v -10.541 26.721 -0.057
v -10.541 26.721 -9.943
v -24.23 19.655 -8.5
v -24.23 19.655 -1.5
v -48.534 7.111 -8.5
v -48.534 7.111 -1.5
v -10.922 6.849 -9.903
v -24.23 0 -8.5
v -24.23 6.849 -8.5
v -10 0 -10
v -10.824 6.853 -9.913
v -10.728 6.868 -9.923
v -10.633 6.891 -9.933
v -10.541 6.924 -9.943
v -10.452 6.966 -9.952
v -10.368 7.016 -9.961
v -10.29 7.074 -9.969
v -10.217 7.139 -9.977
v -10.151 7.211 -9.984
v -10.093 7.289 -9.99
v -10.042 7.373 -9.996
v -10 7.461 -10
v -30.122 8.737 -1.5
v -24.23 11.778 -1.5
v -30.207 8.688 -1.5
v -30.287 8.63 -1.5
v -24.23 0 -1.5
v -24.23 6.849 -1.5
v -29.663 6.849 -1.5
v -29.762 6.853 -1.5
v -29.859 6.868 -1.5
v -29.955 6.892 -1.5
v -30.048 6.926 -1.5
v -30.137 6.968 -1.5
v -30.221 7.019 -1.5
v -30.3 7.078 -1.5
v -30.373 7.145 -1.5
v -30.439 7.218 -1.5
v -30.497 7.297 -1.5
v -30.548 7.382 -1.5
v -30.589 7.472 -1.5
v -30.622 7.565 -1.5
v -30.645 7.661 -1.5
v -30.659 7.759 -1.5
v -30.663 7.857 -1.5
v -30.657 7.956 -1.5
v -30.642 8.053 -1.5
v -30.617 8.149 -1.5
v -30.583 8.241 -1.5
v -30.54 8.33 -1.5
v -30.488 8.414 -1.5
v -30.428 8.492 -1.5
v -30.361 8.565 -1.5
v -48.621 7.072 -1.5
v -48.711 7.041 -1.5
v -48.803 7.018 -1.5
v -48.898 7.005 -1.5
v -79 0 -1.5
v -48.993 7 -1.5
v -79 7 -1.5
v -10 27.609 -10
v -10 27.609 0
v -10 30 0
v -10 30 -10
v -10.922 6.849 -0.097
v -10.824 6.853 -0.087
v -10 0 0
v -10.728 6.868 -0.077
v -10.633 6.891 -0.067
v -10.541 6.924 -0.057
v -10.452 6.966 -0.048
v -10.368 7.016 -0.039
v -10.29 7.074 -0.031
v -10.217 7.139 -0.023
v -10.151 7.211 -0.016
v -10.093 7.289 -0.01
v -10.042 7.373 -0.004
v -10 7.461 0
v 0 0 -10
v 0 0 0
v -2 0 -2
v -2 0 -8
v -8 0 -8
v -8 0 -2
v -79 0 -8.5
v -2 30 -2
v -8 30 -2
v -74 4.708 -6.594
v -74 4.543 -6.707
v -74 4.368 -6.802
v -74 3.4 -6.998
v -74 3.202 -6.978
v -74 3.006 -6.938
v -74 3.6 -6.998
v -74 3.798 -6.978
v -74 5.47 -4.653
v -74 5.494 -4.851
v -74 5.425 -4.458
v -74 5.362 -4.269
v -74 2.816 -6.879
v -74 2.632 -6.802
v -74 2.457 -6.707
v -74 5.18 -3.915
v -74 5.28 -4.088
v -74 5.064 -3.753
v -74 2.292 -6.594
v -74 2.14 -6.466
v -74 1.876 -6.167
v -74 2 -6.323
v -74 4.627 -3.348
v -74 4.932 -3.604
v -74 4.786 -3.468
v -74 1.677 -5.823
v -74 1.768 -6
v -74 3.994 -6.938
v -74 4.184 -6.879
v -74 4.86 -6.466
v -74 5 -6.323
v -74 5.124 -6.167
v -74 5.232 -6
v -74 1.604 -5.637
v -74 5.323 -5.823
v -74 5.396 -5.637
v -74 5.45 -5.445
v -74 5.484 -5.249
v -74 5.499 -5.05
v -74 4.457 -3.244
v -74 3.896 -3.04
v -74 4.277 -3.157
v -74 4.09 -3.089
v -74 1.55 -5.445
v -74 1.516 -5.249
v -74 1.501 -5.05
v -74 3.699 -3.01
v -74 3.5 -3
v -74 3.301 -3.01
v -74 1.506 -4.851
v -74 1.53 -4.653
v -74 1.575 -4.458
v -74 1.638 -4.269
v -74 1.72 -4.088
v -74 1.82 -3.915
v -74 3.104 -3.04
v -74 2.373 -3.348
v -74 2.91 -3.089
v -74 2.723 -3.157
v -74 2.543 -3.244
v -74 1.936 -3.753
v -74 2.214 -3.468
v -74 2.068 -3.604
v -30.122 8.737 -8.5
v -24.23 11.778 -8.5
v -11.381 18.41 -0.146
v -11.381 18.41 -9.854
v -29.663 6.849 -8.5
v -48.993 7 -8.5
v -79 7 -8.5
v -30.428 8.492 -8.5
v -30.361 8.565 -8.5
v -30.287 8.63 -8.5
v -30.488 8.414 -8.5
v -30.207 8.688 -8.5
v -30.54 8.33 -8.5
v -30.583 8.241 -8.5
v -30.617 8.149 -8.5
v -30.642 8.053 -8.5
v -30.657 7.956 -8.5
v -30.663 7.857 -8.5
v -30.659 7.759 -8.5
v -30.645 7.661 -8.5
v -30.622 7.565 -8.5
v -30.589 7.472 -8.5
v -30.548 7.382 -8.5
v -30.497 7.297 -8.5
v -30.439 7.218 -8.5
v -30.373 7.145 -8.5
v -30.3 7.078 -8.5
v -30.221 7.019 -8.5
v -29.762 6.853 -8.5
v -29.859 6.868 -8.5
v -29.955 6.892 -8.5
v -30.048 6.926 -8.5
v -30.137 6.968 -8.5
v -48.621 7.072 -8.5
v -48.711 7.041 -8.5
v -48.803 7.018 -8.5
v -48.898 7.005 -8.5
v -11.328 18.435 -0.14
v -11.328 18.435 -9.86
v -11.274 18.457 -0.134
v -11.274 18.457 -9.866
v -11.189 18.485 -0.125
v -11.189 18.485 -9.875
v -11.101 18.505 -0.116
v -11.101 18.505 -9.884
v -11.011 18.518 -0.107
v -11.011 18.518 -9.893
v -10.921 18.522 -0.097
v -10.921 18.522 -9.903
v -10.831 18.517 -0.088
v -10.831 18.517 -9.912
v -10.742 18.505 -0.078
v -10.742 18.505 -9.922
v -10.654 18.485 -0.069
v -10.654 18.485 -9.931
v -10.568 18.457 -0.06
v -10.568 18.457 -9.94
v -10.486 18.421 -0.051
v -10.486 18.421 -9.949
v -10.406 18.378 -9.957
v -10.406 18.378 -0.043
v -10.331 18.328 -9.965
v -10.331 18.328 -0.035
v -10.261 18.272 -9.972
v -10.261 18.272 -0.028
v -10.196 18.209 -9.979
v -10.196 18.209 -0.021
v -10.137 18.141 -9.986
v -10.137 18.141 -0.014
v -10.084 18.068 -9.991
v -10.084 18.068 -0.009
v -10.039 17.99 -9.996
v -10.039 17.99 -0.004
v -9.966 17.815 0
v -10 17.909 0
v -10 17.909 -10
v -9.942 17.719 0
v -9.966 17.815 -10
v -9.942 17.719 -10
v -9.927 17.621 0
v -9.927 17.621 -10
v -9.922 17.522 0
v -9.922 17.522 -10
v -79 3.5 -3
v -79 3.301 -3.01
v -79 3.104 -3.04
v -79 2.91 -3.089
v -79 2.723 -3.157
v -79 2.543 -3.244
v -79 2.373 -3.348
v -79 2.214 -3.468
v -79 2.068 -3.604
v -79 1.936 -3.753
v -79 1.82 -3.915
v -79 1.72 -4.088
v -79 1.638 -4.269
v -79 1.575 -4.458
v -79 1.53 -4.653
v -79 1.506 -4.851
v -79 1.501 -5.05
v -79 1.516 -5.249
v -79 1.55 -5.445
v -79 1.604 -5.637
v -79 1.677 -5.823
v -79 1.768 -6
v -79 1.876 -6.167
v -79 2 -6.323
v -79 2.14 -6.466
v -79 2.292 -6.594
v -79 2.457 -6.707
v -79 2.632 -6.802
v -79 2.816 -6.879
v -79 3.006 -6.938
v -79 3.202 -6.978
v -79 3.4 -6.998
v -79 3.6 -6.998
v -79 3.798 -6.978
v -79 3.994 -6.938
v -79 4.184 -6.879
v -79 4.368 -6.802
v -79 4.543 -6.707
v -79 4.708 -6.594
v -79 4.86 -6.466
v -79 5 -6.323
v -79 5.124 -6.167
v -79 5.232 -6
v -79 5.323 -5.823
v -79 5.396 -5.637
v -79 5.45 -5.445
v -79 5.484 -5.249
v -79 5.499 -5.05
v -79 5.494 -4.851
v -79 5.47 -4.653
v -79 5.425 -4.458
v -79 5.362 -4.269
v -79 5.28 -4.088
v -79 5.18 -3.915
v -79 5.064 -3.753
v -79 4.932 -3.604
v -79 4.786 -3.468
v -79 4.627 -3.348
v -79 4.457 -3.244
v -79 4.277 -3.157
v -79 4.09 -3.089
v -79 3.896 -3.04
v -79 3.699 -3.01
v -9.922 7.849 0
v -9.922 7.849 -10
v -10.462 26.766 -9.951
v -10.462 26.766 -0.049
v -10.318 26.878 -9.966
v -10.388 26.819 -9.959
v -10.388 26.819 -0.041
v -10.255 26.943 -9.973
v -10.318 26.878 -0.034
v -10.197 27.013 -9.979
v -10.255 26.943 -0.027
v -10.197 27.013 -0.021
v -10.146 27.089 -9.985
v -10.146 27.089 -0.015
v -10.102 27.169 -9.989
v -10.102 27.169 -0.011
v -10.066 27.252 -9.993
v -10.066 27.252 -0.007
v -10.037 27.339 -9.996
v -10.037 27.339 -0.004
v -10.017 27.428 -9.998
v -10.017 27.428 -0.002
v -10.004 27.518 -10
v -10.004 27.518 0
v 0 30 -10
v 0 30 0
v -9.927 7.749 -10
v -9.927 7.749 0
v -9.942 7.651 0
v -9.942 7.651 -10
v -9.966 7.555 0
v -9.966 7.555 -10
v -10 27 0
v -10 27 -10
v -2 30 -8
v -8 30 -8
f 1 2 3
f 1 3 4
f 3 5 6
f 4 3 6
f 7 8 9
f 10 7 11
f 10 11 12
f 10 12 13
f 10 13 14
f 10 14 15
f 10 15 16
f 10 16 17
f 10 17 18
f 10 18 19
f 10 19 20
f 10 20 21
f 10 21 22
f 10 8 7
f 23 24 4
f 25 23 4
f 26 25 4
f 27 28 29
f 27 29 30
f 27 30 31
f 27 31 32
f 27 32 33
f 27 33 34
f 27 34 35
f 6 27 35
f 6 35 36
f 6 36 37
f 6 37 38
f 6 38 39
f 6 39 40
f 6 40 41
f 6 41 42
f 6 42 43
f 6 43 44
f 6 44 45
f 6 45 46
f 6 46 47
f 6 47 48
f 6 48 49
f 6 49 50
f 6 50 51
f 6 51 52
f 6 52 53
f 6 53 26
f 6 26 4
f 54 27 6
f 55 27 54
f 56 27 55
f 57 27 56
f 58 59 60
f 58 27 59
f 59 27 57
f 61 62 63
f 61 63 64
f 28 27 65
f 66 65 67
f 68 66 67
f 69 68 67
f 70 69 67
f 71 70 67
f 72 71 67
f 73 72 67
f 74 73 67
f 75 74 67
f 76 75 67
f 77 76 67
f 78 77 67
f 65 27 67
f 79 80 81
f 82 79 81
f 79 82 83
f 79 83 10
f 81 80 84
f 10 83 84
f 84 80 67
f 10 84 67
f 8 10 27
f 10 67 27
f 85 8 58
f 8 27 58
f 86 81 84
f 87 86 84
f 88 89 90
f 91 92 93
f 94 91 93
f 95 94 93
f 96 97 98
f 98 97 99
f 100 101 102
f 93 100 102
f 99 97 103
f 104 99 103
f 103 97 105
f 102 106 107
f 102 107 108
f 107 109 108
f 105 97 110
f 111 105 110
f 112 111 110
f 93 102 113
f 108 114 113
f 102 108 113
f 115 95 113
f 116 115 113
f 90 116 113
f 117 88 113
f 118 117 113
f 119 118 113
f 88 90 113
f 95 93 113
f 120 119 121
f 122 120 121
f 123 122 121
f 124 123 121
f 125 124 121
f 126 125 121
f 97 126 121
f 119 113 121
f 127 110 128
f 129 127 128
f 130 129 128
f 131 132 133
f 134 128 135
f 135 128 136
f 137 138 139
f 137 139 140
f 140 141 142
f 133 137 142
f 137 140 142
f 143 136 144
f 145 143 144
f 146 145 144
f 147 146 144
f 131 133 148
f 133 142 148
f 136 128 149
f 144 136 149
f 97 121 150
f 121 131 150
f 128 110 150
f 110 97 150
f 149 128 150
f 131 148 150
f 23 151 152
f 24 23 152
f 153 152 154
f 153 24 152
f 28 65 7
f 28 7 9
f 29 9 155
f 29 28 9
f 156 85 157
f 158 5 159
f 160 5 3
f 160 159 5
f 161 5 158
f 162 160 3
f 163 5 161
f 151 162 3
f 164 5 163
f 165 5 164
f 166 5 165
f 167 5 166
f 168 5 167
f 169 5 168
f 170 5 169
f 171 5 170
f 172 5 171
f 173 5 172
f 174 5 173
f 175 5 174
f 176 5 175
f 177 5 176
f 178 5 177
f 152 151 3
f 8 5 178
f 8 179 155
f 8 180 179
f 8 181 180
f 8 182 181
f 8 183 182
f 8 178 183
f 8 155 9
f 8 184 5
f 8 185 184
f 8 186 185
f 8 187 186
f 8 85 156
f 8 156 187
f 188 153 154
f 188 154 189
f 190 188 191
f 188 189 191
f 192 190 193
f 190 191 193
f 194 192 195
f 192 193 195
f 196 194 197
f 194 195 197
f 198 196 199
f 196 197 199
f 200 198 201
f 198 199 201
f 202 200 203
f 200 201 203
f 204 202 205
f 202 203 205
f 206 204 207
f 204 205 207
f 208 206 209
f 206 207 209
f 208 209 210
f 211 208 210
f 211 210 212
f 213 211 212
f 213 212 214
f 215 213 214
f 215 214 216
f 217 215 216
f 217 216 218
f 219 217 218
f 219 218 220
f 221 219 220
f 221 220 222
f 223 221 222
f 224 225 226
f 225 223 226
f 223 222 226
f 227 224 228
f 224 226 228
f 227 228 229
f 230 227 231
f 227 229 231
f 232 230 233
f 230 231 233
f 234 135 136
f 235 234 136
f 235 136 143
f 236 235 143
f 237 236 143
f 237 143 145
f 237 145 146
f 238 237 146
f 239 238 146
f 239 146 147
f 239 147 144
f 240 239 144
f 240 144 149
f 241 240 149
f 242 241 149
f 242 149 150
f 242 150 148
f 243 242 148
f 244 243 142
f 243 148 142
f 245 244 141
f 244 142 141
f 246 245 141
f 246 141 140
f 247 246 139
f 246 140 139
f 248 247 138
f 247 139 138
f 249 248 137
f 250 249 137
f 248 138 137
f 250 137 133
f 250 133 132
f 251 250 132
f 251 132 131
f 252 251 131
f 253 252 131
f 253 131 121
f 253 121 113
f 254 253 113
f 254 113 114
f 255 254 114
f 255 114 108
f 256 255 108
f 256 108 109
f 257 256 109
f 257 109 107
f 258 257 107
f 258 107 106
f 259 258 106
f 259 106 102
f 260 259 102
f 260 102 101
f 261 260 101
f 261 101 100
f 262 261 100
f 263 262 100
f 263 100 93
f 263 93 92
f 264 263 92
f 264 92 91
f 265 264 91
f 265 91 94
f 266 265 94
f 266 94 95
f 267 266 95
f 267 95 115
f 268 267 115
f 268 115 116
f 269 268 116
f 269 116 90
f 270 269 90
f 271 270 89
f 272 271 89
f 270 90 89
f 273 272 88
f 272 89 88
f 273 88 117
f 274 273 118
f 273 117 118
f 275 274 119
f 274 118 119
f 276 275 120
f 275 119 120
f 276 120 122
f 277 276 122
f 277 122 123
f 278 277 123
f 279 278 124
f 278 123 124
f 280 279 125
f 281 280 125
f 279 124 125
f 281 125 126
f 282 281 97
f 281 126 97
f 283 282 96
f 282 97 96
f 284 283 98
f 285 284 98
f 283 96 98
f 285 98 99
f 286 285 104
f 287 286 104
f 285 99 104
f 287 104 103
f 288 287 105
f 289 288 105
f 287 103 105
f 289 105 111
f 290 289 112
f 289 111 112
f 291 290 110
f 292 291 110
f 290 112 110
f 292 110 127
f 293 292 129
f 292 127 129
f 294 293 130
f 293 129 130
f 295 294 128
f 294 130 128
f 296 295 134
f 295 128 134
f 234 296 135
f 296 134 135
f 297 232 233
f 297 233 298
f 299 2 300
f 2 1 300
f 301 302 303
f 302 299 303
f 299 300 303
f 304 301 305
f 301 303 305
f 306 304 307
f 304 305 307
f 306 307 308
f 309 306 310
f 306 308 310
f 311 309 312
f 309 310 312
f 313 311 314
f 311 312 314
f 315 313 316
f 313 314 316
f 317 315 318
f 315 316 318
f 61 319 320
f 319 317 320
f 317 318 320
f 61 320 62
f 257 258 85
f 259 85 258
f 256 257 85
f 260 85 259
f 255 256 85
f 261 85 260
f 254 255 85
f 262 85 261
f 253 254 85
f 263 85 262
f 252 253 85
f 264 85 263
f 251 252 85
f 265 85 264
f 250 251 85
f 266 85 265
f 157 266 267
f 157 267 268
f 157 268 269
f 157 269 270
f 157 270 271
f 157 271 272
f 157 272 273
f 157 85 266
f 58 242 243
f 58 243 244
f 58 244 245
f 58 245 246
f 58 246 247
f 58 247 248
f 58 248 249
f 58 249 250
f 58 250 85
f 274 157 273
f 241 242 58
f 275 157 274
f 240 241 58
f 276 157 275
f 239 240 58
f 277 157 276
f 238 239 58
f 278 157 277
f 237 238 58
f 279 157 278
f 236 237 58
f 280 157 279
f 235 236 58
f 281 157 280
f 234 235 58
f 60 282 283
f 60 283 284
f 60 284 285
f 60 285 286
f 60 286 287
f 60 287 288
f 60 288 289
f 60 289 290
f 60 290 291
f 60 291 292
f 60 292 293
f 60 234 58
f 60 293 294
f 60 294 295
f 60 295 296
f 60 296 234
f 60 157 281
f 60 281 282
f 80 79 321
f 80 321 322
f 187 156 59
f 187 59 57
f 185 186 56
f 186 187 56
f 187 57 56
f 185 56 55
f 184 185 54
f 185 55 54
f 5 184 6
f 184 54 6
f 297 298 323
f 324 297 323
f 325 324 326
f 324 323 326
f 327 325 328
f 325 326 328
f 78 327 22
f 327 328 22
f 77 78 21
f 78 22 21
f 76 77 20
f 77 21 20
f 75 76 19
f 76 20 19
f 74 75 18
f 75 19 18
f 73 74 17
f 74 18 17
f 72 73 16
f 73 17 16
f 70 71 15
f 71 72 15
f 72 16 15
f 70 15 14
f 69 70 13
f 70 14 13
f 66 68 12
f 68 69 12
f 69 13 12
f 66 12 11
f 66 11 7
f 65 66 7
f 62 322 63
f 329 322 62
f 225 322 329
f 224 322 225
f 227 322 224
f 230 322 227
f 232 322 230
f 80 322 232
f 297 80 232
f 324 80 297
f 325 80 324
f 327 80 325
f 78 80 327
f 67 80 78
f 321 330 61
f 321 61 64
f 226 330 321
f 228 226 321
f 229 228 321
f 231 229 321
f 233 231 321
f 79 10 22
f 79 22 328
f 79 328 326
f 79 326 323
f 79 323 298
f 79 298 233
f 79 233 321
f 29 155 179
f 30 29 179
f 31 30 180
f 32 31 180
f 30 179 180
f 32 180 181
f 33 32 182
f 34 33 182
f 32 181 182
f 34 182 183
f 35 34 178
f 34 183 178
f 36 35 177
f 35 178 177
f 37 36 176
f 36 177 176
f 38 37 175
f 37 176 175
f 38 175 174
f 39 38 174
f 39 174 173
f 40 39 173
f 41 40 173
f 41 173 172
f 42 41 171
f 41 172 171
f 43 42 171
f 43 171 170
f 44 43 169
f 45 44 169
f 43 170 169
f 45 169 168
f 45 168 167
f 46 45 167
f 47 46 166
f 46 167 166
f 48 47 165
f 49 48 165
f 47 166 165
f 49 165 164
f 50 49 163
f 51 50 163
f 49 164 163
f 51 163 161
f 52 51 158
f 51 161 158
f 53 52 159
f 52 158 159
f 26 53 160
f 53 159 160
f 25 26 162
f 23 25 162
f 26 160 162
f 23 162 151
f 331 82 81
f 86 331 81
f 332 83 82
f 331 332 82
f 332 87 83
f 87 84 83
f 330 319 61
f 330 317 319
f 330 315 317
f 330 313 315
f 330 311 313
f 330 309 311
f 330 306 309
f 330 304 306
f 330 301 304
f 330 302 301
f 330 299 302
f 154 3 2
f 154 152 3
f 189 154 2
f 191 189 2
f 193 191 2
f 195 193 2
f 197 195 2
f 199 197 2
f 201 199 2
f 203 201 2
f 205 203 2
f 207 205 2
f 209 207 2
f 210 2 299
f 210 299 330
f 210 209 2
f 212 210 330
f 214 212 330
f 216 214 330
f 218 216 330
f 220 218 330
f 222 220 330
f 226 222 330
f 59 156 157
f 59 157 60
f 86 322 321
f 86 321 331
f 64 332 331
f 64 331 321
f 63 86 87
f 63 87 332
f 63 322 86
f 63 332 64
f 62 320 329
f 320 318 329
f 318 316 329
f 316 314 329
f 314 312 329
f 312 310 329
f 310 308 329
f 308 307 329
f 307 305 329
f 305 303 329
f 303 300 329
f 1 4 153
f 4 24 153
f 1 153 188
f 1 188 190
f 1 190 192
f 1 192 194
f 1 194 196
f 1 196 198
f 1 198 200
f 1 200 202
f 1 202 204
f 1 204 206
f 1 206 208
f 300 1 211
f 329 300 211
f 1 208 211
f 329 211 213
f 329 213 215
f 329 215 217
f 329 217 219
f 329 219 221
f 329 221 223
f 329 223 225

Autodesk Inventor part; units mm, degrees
ref_plane "YZ Plane" through (0, 0, 0) normal (1, 0, 0) x (0, 1, 0)
ref_plane "XZ Plane" through (0, 0, 0) normal (0, 1, 0) x (-1, 0, 0)
ref_plane "XY Plane" through (0, 0, 0) normal (0, 0, 1) x (1, 0, 0)
sketch "Sketch1" plane through (0, 0, 0) normal (0, 1, 0) x (-1, 0, 0)
  line L0 (0, 0) -> (10, 0)
  line L1 (10, 0) -> (10, -10)
  line L2 (10, -10) -> (0, -10)
  line L3 (0, -10) -> (0, 0)
  line L4 (10, 0) -> (0, -10) construction
  line L5 (10, -10) -> (0, 0) construction
  line L6 (2, -2) -> (8, -2)
  line L7 (8, -2) -> (8, -8)
  line L8 (8, -8) -> (2, -8)
  line L9 (2, -8) -> (2, -2)
  line L10 (2, -2) -> (8, -8) construction
  line L11 (8, -2) -> (2, -8) construction
  point P0 (5, -5)
  dimension "d0" = 10
  dimension "d4" = 6
  dimension "d5" = 6
extrude "Extrusion1" add sketch "Sketch1" along normal blind 30
sketch "Sketch2" plane through (-10, 0, -10) normal (-1, 0, 0) x (0, 0, 1)
  line L0 (0, 30) -> (10, 30) construction
  line L1 (10, 0) -> (0, 0) projected
  line L2 (10, 0) -> (0, 0) construction
  line L3 (0, 0) -> (0, 7)
  line L4 (0, 7) -> (10, 7)
  line L5 (10, 7) -> (10, 0)
  line L6 (0, 0) -> (0, 30) construction
  line L7 (10, 0) -> (10, 30) construction
  dimension "d8" = 7
  dimension "d9" = 10
extrude "Extrusion2" add sketch "Sketch2" along normal blind 69
chamfer "Chamfer1" distance 20 distance2 38.75 1 edges at (-10, 7, -5) measured on face at (-10, 14.6667, -6.6667)
sketch "Sketch3" plane through (0, 0, 0) normal (0, 0, 1) x (1, 0, 0)
  line L0 (-48.75, 7) -> (-79, 7) construction
  line L1 (-10, 27) -> (-10, 30) construction
  line L2 (-9.9219, 6.8486) -> (-33.7809, 6.8486)
  line L3 (-33.7809, 6.8486) -> (-9.9219, 19.163)
  line L4 (-9.9219, 19.163) -> (-9.9219, 6.8486)
  line L5 (-48.75, 7) -> (-10, 27) projected
  point P0 (0, 0)
  dimension "d21" = 7
extrude "Extrusion3" cut sketch "Sketch3" against normal through all
sketch "Sketch6" plane through (0, 0, 0) normal (0, -1, 0) x (1, 0, 0)
  line L0 (-79, -10) -> (-79, 0) construction
  line L1 (-79, -5) -> (0, -5) construction
  line L2 (0, 0) -> (0, -10) construction
  line L3 (-24.2304, -1.5) -> (-79, -1.5)
  line L4 (-79, -1.5) -> (-79, -8.5)
  line L5 (-79, -8.5) -> (-24.2304, -8.5)
  line L6 (-24.2304, -8.5) -> (-24.2304, -1.5) construction
  line L7 (-24.2304, -1.5) -> (-79, -8.5) construction
  line L8 (-79, -1.5) -> (-24.2304, -8.5) construction
  line L9 (-24.2304, -8.5) -> (0, -8.5) construction
  line L10 (-24.2304, -1.5) -> (0, -1.5) construction
  line L11 (-24.2304, -8.5) -> (-10, -10)
  line L12 (0, -10) -> (-10, -10) construction
  line L13 (-24.2304, -1.5) -> (-10, 0)
  line L14 (-10, 0) -> (0, 0) construction
  line L15 (-10, -10) -> (-10, -18.6026)
  line L16 (-10, -18.6026) -> (-95.3433, -18.6026)
  line L17 (-95.3433, -18.6026) -> (-95.3433, 10.4)
  line L18 (-95.3433, 10.4) -> (-10, 10.4)
  line L19 (-10, 10.4) -> (-10, 0)
  point P0 (-51.6152, -5)
  dimension "d22" = 7
extrude "Extrusion5" cut sketch "Sketch6" against normal through all
hole "Hole1" at (-79, 3.5, -5) direction (1, 0, 0) diameter 4 depth 5
fillet "Fillet1" radius 1 5 edges at (-33.7809, 6.8486, -5) (-9.9219, 6.8486, -5) (-9.9219, 19.163, -5) (-48.75, 7, -5) (-10, 27, -5)
properties part number "foot_1_2_small"
